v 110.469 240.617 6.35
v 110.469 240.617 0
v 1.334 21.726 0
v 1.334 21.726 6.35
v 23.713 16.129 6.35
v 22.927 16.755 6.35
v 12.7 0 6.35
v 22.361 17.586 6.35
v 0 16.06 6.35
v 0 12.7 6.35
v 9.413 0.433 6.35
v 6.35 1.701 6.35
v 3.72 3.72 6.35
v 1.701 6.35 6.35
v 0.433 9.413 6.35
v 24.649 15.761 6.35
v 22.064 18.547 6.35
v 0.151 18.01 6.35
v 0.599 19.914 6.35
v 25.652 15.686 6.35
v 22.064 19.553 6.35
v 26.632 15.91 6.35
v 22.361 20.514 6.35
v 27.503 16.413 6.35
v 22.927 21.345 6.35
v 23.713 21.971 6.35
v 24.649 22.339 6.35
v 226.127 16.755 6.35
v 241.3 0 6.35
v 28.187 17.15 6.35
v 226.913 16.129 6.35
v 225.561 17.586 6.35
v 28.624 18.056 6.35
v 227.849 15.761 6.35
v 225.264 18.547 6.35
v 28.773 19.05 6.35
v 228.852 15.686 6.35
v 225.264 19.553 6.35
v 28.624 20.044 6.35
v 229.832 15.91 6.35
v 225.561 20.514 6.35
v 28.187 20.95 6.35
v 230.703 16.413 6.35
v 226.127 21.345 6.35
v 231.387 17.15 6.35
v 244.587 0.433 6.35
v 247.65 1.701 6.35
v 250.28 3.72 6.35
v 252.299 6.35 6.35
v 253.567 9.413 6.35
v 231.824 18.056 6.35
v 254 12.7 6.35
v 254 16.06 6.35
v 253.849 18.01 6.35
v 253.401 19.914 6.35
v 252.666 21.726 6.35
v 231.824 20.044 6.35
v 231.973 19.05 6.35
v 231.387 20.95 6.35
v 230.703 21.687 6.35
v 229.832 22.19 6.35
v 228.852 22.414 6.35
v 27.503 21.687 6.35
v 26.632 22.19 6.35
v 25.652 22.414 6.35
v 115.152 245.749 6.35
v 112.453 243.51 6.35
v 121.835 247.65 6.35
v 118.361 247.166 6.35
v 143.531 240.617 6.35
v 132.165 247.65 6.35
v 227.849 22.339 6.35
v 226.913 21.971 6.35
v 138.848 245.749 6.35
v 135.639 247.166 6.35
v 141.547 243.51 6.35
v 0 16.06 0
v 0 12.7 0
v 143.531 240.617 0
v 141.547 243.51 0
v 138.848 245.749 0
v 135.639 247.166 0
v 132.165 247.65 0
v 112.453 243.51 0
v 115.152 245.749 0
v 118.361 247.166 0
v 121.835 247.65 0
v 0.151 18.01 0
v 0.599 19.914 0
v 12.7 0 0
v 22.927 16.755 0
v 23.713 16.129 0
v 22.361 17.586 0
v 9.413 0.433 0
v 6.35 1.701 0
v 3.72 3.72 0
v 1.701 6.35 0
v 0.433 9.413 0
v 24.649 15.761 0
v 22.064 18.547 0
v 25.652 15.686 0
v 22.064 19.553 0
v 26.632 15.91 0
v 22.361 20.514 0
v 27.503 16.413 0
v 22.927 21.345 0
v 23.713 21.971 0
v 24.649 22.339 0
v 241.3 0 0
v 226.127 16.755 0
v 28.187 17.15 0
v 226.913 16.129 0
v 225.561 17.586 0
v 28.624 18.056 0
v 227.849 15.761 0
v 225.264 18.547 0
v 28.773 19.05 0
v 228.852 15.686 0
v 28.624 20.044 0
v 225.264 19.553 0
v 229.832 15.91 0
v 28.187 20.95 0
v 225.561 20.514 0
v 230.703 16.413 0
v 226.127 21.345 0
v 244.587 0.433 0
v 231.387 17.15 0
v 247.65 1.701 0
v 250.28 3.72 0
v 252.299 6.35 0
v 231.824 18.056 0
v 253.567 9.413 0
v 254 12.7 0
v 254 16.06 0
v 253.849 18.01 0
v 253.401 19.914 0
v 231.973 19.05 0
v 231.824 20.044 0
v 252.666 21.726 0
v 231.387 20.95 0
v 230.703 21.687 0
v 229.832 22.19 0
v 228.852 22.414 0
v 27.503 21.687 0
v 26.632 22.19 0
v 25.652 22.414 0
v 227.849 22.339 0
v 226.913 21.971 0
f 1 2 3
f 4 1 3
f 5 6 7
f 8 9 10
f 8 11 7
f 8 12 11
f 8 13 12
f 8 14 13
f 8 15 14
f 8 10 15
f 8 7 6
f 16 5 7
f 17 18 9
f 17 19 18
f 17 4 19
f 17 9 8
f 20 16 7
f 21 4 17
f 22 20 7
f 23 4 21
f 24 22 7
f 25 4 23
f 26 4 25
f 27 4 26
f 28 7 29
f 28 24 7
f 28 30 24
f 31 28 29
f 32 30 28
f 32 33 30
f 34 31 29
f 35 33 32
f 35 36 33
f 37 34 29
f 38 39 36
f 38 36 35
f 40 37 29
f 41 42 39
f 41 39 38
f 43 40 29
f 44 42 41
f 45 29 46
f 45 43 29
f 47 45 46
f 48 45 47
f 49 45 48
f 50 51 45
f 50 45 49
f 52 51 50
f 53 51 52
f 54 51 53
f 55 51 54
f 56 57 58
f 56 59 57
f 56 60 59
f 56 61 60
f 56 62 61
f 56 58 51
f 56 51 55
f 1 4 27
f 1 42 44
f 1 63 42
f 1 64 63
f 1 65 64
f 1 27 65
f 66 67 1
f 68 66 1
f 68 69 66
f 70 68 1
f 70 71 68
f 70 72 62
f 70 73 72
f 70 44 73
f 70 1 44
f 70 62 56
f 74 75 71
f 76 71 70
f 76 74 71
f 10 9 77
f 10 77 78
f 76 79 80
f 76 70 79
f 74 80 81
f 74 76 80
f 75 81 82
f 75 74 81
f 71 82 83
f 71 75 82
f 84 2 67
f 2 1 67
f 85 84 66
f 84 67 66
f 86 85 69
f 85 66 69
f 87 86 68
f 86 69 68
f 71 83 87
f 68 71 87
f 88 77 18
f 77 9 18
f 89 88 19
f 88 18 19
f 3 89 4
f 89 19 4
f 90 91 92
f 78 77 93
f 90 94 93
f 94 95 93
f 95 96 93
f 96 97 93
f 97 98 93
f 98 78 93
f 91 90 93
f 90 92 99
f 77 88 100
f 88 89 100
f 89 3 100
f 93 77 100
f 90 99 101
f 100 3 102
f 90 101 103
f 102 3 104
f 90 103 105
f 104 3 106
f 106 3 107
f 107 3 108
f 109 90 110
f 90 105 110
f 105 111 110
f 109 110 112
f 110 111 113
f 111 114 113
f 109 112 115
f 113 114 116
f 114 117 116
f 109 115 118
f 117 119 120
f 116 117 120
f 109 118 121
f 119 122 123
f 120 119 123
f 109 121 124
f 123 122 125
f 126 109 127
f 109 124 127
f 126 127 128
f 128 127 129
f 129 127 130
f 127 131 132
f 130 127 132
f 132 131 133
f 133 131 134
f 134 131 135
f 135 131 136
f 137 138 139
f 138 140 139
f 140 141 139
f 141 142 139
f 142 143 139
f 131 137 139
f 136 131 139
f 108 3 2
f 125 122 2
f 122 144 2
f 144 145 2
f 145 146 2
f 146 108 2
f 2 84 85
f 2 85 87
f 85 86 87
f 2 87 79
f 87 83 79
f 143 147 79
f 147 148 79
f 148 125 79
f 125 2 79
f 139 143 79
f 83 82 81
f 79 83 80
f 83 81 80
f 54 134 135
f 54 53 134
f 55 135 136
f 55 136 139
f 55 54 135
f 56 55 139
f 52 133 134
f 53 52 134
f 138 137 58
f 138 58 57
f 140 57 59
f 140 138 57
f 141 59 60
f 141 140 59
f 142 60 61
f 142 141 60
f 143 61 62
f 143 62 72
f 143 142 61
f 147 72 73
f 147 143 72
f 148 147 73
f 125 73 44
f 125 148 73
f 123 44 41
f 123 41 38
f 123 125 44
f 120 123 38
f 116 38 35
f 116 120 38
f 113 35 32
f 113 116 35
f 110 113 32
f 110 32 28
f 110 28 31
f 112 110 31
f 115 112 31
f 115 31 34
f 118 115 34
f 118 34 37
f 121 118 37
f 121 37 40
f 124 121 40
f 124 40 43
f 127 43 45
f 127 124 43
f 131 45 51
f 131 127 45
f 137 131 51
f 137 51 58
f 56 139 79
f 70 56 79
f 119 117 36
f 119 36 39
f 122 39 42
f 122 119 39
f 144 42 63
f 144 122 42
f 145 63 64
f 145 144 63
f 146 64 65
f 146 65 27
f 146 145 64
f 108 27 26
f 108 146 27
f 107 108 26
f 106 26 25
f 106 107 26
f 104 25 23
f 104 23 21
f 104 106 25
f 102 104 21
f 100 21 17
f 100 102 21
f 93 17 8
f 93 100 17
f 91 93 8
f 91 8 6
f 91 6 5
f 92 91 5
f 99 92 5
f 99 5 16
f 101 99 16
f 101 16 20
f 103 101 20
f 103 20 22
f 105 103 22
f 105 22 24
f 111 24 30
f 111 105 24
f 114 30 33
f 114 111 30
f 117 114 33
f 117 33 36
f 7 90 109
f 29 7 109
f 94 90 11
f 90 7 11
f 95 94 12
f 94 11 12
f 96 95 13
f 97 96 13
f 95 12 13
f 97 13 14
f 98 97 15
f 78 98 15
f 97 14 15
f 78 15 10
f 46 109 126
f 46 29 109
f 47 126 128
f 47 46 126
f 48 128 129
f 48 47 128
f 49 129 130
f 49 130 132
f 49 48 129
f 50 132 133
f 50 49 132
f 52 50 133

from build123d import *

# Parameters (mm, degrees)
SKETCH1_R           = 3.3734375
BOSS_EXTRUDE1_DEPTH = 6.35
FILLET2_R           = 12.7


with BuildPart() as part:
    # Sketch1 → Boss-Extrude1 (new body)
    with BuildSketch(Plane.XY):
        Polygon((0, 0), (254, 0), (254, 19.05), (140.024244399, 247.65), (113.975755601, 247.65), (0, 19.05), align=None)
        with Locations((25.4, 19.05)):
            Circle(SKETCH1_R, mode=Mode.SUBTRACT)
        with Locations((228.6, 19.05)):
            Circle(SKETCH1_R, mode=Mode.SUBTRACT)
    extrude(amount=BOSS_EXTRUDE1_DEPTH)

    # Fillet2
    fillet2_edges = [part.edges().sort_by_distance(p)[0] for p in [
        (0, 19.05, 3.175),
        (113.975755601, 247.65, 3.175),
        (140.024244399, 247.65, 3.175),
        (254, 19.05, 3.175),
        (254, 0, 3.175),
        (0, 0, 3.175),
    ]]
    fillet(fillet2_edges, radius=FILLET2_R)


solid = part.part
